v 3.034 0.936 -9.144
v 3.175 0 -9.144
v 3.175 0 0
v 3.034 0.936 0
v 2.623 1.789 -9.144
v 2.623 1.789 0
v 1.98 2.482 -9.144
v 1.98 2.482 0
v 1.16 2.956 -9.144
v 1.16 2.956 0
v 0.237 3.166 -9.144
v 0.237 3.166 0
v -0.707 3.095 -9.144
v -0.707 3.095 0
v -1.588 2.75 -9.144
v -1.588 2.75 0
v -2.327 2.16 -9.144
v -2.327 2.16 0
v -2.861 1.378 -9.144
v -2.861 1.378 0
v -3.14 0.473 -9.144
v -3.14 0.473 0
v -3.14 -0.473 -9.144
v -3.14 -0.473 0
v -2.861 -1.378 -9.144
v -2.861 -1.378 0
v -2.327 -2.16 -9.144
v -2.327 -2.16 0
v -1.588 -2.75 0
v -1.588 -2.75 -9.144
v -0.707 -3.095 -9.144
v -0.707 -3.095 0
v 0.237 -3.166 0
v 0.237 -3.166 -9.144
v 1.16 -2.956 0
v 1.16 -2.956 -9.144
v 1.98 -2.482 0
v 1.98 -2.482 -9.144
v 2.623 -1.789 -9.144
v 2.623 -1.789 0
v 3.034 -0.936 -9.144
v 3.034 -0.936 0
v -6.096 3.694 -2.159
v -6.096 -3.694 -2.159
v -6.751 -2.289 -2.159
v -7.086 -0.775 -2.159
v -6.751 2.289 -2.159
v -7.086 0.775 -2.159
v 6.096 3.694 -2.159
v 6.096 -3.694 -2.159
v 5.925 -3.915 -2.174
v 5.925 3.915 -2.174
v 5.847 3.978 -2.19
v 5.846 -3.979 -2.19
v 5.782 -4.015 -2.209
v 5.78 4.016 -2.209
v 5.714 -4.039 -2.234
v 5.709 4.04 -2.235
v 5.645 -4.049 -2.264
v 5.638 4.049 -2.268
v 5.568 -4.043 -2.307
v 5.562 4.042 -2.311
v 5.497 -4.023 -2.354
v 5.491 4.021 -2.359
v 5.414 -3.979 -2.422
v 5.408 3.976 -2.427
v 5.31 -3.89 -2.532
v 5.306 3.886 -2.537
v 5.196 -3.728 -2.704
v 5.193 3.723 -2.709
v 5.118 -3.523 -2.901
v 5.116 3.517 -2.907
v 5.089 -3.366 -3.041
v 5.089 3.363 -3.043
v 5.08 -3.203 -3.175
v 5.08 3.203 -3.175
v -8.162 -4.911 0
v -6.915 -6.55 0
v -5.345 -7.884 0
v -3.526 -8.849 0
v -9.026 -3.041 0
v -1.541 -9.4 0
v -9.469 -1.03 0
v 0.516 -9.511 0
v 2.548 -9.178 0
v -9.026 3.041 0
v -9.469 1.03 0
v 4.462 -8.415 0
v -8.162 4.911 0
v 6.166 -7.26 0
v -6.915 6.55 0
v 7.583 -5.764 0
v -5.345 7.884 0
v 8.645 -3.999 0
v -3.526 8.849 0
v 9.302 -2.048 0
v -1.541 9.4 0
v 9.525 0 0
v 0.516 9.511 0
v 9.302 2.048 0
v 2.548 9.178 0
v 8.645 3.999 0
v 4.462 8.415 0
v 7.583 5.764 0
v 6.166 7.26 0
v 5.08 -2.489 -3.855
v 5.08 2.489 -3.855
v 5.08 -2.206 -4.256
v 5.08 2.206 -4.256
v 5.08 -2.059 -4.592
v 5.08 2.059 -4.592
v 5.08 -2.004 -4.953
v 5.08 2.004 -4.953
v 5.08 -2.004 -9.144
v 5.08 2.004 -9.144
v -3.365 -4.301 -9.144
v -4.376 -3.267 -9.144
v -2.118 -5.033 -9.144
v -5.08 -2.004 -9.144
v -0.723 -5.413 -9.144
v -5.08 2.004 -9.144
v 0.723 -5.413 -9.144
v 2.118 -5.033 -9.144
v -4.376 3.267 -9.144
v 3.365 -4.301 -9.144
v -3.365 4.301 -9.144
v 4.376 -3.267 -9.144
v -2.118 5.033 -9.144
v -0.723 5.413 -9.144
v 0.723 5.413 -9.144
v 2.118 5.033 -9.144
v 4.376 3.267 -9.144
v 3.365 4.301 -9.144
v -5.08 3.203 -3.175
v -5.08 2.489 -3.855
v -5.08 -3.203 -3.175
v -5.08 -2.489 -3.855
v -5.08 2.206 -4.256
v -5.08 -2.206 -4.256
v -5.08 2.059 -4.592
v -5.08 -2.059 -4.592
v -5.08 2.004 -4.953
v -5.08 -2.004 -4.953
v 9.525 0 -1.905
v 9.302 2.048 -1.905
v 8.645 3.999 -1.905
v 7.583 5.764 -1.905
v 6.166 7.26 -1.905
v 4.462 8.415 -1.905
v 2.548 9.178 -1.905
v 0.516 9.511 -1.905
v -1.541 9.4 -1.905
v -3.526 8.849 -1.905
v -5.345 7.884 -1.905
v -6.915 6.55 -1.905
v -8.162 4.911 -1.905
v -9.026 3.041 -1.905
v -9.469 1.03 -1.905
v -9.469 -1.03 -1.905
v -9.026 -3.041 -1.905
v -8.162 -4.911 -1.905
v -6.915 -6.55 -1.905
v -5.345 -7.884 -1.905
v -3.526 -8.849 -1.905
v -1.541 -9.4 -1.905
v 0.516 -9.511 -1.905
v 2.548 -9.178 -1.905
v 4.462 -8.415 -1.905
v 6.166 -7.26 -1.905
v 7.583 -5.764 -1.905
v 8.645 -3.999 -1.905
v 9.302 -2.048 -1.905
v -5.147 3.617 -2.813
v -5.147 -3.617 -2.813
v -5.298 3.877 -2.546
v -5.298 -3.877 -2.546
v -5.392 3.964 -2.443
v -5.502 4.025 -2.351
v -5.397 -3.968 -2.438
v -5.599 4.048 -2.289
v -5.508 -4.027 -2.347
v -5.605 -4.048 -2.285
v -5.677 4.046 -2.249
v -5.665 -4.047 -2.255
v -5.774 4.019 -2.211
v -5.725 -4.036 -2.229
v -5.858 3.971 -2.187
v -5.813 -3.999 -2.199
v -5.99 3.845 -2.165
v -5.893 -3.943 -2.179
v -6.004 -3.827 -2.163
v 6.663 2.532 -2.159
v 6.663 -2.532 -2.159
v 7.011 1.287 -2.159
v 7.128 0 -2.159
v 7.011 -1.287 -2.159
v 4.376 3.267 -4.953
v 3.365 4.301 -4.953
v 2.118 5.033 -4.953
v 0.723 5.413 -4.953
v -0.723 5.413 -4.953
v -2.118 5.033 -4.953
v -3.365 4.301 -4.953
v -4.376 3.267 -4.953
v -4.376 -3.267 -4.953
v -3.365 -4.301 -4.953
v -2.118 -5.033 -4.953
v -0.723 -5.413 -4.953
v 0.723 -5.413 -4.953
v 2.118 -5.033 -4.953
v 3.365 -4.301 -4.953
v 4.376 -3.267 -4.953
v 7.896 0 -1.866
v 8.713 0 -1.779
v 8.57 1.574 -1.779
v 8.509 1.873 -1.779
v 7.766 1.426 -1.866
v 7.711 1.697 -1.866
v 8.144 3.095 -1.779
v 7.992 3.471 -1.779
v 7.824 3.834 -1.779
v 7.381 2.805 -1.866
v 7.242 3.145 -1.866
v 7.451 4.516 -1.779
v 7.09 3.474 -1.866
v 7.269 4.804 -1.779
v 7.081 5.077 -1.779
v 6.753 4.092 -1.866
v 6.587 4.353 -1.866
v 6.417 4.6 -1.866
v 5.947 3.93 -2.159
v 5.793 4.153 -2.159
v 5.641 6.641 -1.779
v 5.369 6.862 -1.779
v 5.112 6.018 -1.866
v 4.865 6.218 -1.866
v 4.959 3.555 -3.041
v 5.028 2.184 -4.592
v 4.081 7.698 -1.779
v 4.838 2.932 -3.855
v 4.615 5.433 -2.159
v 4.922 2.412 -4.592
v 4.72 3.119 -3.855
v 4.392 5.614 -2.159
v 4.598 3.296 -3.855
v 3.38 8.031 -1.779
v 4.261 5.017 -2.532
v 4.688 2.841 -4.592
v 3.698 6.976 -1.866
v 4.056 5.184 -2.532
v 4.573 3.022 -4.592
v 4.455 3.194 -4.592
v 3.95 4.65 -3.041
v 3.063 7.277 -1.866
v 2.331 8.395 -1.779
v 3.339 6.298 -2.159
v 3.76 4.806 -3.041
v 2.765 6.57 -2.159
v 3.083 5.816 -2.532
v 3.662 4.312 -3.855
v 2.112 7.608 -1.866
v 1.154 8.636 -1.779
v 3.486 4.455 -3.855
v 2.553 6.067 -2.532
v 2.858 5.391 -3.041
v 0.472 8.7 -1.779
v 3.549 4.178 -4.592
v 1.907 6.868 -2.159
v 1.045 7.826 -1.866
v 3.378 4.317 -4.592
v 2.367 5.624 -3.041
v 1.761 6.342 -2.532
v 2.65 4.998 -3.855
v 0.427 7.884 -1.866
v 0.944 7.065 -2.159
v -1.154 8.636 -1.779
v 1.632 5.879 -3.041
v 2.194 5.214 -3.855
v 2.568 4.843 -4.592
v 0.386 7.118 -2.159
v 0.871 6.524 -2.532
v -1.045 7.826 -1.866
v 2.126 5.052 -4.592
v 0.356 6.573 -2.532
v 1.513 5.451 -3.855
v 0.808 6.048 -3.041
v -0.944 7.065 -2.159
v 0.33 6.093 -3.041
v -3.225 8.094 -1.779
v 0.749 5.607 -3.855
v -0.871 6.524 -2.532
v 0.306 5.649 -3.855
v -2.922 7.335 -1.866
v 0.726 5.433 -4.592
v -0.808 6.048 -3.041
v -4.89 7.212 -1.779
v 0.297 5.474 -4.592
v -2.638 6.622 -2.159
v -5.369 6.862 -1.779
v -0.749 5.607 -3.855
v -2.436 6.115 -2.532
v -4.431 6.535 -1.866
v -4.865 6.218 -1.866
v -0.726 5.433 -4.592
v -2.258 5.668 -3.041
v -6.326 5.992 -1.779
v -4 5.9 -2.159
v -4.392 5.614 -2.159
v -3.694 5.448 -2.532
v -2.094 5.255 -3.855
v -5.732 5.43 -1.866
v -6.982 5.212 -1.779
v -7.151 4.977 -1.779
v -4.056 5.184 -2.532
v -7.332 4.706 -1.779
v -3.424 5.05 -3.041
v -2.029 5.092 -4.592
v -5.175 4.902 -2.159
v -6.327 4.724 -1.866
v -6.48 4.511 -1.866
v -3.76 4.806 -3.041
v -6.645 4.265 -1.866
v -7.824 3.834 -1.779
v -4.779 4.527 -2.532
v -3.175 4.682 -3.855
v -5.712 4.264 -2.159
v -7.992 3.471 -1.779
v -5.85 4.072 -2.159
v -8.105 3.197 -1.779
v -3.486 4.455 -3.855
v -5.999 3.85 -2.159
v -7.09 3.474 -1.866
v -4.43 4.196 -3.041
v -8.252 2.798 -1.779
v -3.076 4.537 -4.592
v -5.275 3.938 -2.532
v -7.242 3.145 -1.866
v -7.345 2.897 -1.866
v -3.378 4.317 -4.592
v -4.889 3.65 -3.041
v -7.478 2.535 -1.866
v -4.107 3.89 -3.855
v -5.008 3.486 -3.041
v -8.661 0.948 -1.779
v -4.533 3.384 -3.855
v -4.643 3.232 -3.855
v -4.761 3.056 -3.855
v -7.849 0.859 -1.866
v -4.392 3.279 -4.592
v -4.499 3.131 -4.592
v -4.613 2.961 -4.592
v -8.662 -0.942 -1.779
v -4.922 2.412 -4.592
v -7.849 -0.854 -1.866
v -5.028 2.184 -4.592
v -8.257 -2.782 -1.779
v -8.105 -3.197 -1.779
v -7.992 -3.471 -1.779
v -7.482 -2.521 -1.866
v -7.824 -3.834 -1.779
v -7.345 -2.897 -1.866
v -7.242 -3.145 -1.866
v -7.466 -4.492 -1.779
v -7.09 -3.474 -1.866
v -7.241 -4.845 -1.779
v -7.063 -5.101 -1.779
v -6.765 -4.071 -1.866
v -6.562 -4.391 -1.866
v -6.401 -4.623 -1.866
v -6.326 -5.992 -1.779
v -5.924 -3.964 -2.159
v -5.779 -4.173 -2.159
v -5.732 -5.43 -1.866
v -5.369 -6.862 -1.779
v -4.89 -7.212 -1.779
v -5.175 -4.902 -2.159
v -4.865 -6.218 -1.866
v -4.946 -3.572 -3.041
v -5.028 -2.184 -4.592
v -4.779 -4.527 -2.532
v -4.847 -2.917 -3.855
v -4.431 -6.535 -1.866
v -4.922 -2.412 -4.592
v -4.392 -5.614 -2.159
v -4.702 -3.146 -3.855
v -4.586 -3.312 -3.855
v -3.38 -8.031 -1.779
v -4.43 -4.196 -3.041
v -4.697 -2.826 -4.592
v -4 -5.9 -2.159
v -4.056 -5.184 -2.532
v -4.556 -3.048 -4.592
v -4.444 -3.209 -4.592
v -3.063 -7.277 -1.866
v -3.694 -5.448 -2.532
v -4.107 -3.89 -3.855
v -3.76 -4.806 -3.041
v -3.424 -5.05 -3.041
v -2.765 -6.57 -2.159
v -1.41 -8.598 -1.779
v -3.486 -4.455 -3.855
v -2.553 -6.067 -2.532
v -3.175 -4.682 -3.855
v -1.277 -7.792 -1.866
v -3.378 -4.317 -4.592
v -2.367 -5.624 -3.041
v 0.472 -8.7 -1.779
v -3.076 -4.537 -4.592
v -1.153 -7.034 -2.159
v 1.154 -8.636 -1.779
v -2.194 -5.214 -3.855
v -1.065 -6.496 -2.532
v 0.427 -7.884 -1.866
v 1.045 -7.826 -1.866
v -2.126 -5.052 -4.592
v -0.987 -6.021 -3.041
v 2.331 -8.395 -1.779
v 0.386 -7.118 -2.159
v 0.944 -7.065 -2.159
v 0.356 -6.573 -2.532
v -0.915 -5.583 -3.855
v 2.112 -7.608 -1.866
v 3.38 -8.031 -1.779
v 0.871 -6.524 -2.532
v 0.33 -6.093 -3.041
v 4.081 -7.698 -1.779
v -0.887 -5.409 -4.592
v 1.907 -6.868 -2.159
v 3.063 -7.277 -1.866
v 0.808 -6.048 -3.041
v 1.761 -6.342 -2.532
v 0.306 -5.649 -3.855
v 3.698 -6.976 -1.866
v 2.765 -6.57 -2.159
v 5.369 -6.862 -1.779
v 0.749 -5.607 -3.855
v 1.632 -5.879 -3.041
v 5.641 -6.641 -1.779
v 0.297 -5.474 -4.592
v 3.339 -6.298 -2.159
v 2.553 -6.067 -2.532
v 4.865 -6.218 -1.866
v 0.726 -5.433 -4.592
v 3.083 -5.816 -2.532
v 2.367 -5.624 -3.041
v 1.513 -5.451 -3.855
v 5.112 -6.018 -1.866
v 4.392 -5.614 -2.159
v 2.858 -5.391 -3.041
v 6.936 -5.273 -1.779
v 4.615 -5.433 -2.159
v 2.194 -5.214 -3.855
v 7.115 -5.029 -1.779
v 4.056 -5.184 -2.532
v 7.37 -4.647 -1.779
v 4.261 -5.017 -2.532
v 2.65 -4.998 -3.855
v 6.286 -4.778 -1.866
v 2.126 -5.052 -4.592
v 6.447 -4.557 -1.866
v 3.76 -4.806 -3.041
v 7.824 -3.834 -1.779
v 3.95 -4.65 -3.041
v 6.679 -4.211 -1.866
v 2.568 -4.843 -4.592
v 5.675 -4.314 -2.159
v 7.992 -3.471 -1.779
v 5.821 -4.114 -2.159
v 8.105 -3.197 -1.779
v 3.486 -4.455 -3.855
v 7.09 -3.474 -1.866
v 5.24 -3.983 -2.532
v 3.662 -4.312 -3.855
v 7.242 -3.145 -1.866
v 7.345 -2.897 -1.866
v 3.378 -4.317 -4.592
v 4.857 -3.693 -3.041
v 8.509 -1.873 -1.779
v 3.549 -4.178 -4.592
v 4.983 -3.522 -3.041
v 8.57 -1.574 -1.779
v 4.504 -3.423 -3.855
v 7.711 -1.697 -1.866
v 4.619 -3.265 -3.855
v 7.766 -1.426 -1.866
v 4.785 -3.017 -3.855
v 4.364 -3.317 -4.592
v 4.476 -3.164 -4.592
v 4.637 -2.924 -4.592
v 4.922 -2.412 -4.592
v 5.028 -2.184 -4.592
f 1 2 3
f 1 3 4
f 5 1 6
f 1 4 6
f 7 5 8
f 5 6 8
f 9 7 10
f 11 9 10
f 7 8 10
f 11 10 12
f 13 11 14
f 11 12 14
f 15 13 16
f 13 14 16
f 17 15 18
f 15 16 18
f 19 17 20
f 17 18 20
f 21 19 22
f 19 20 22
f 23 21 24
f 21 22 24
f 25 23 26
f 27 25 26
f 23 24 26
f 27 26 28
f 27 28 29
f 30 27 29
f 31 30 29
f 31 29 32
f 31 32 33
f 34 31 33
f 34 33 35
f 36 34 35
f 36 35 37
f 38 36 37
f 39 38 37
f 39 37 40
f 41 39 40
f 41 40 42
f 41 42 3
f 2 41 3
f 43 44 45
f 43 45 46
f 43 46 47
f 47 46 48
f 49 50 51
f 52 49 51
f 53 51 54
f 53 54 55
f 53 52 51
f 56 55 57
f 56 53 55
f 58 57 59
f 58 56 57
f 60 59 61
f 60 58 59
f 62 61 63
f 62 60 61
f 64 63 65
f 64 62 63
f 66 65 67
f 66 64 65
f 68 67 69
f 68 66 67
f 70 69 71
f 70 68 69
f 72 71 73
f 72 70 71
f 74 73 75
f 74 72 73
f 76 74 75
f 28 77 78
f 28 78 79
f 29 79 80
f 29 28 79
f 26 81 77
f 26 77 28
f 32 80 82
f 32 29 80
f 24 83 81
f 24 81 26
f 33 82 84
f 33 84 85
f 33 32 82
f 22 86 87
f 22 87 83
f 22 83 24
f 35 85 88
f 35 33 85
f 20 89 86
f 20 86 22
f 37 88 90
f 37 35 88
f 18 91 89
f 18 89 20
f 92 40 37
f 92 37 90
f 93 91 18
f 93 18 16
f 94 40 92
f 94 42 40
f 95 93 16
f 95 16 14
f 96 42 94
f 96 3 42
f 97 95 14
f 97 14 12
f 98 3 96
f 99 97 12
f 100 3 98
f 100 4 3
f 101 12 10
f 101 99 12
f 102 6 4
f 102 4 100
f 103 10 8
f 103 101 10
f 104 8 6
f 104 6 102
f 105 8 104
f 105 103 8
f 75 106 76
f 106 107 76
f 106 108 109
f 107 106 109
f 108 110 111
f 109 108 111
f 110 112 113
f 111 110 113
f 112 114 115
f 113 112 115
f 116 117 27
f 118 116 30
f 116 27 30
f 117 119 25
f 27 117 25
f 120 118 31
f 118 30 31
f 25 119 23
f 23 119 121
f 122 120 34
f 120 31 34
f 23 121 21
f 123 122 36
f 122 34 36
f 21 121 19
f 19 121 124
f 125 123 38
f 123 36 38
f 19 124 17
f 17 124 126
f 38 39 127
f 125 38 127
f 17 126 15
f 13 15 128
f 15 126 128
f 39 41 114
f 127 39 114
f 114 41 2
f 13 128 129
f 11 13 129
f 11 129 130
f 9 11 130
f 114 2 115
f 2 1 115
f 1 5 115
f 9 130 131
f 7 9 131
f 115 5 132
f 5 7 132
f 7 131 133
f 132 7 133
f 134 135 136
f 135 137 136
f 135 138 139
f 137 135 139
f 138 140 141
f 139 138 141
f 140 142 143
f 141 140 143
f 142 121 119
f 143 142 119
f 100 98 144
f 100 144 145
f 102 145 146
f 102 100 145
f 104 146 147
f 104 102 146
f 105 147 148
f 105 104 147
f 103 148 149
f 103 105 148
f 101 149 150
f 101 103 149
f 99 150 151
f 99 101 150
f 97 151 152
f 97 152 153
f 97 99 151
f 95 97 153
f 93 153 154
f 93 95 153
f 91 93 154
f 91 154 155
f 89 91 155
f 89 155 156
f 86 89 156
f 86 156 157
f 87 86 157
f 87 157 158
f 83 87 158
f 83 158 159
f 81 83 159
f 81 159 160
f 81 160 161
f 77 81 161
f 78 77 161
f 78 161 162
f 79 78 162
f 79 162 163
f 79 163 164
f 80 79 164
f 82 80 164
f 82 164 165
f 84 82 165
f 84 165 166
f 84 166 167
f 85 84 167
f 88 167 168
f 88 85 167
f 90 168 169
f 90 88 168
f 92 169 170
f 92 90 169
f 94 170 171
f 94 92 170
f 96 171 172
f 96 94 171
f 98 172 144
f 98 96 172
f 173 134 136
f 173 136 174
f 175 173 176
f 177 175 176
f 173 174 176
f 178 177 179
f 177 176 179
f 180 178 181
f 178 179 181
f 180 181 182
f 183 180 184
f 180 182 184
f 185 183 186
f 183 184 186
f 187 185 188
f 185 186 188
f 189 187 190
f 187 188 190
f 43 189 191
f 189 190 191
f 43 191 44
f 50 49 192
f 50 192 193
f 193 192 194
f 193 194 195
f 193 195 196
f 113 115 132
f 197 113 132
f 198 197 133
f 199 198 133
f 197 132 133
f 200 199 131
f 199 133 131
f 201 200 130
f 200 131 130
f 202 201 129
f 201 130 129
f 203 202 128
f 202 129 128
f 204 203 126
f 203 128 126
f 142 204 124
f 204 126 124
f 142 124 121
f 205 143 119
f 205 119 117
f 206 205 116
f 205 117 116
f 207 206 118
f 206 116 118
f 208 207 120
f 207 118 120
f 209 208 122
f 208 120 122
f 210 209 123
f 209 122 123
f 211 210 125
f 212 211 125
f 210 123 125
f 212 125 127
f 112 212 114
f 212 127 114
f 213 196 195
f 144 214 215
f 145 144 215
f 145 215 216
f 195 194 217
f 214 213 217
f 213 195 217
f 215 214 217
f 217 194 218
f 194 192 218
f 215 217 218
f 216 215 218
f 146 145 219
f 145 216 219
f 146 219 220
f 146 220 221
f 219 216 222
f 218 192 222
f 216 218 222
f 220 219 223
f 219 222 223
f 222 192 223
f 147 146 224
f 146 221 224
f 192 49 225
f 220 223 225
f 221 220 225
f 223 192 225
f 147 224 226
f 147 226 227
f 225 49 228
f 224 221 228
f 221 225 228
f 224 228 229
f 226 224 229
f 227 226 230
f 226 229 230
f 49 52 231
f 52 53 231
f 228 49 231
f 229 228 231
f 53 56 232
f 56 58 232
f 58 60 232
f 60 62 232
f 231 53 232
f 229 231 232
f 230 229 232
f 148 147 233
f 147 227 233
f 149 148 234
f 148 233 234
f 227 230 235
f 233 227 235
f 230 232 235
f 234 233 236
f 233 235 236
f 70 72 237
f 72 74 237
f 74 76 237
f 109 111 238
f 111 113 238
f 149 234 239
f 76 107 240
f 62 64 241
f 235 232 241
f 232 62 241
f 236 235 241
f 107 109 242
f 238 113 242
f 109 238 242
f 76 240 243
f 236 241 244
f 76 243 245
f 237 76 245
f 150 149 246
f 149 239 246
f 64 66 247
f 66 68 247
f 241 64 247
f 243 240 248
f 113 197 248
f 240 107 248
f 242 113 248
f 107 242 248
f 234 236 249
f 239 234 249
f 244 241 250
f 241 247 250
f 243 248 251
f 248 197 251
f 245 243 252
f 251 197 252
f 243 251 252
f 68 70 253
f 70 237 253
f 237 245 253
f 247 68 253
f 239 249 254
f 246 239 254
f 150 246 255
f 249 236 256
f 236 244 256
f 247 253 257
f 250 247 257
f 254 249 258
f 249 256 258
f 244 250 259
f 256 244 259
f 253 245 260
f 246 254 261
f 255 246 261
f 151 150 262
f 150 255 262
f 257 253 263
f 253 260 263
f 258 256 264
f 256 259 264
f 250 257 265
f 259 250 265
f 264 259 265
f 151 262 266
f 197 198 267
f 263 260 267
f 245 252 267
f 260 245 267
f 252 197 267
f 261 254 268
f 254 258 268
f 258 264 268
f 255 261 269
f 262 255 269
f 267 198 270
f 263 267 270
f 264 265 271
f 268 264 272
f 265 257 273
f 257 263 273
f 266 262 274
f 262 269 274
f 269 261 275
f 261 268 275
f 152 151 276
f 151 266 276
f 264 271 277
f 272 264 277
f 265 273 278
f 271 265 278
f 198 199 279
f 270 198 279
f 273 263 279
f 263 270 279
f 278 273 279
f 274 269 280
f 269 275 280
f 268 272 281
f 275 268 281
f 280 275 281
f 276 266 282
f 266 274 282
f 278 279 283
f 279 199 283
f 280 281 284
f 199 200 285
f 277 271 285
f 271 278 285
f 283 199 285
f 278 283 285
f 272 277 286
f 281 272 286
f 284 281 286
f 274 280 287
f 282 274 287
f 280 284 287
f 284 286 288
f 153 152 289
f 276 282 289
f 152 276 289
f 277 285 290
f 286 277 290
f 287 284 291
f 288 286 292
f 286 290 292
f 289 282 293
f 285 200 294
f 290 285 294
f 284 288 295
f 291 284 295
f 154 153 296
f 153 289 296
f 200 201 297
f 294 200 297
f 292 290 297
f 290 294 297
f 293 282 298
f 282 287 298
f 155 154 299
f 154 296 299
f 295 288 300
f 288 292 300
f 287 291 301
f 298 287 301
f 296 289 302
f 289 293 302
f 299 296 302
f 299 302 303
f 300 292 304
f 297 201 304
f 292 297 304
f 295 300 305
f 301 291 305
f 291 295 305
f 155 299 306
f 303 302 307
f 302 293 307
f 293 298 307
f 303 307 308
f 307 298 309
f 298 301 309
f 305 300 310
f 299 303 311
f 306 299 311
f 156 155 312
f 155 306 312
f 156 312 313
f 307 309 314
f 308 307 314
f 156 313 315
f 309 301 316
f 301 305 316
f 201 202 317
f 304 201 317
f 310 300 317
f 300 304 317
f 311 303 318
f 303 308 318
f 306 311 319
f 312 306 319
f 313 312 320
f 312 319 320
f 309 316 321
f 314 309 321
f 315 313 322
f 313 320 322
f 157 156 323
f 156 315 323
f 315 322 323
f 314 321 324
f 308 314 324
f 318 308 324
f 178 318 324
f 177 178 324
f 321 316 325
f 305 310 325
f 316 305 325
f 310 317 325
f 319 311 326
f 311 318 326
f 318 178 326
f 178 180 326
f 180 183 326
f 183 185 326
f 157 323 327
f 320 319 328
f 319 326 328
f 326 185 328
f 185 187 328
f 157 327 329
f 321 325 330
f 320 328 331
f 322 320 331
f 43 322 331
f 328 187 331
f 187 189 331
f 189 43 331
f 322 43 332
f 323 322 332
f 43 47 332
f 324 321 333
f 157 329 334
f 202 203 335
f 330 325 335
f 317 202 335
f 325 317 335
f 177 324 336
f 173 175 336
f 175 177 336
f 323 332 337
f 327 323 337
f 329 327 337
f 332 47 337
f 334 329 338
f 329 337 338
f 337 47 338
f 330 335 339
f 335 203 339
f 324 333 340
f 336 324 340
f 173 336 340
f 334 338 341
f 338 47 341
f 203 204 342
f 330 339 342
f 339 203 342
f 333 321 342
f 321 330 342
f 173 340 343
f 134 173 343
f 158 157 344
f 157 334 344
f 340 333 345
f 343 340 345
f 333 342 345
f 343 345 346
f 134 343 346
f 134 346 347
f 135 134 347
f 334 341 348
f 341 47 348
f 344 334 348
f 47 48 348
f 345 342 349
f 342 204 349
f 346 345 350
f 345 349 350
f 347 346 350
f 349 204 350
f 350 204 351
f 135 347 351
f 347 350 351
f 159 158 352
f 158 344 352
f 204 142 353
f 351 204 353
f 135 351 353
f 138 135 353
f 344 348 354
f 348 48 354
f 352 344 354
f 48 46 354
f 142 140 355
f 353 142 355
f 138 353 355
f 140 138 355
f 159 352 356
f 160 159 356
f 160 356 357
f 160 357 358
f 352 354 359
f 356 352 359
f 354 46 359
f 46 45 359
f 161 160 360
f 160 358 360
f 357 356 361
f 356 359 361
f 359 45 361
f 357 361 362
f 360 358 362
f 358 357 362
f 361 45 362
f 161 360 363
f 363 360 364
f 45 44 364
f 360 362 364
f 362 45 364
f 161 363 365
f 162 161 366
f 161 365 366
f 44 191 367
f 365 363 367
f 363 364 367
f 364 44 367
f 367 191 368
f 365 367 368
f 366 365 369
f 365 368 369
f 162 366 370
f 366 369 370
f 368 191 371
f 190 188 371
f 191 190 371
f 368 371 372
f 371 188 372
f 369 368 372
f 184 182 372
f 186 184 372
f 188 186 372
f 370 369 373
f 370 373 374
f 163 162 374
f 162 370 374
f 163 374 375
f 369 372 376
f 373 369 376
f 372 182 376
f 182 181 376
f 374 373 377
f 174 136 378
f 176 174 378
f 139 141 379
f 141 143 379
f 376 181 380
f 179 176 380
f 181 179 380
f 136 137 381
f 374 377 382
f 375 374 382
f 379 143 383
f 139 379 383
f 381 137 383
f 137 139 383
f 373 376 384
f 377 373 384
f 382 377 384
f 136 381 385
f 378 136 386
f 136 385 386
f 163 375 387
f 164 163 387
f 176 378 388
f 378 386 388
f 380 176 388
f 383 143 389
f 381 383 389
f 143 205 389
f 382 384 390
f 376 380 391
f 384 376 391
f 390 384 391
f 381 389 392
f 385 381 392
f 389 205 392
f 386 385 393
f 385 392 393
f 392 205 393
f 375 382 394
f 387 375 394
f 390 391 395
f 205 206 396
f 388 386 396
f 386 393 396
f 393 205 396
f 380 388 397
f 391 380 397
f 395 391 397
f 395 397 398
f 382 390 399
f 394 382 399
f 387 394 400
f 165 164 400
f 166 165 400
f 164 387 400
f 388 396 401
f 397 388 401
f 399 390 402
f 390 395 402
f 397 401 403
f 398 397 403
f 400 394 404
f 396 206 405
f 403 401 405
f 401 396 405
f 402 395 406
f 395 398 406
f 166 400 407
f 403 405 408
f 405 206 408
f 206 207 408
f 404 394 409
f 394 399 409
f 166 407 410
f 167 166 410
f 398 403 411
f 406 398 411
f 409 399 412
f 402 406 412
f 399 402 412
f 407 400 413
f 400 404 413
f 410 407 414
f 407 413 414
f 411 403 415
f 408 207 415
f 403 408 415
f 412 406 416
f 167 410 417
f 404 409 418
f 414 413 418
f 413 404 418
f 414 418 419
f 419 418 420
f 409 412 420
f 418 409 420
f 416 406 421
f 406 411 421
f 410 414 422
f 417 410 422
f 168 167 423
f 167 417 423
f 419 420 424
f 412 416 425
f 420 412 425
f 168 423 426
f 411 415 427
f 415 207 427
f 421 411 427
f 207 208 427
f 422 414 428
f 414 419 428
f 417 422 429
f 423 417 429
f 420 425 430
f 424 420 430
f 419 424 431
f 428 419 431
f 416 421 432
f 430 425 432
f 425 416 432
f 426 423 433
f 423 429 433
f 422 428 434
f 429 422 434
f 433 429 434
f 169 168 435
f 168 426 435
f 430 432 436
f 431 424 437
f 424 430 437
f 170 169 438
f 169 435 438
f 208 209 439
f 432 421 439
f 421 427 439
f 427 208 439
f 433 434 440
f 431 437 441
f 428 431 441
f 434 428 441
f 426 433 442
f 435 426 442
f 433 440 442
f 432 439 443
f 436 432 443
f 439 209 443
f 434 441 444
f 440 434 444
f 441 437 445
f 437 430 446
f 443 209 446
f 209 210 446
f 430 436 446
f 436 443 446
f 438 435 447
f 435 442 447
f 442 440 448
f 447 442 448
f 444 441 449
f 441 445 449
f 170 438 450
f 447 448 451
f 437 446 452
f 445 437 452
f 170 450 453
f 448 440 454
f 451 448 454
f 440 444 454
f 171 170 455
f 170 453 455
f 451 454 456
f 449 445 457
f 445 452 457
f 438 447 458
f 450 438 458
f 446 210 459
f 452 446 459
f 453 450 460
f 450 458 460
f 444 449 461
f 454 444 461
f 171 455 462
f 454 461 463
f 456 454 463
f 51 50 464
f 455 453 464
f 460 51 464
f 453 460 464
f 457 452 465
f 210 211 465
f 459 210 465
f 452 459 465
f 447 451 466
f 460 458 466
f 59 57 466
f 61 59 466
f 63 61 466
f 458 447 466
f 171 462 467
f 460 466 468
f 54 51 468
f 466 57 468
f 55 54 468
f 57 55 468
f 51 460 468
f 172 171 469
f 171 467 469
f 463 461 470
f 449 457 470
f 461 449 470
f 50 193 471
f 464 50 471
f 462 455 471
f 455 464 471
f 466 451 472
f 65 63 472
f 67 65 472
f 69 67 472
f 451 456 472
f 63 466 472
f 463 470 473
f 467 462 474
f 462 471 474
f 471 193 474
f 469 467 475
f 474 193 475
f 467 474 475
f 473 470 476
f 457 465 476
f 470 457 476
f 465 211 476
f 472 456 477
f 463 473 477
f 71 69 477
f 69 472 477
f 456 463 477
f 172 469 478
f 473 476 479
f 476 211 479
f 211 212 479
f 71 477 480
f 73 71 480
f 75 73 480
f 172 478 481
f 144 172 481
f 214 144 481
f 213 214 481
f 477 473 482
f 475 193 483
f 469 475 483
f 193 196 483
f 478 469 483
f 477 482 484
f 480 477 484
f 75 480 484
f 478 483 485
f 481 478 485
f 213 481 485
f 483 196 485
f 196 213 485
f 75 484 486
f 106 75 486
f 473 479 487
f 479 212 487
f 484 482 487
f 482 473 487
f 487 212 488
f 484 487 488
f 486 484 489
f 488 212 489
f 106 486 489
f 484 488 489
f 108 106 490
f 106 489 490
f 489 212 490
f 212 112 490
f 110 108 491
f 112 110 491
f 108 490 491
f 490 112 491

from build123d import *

# Parameters (mm, degrees)
F0_R     = 9.525
F0_R_2   = 3.175
F1_DEPTH = 25.4
F2_W     = 5.595942471
F2_H     = 0.8117107314
F4_W     = 5.7437195435
F4_H     = 10.4512684047
F4_H_2   = 14.192732051
F4_W_2   = 5.8874822214
F4_H_3   = 10.6966430321
F5_DEPTH = 6.985
F6_R     = 1.016


with BuildPart() as f1:
    # F0 (on Top) → F1 (new body)
    with BuildSketch(Plane.XY):
        Circle(F0_R)
        Circle(F0_R_2, mode=Mode.SUBTRACT)
    extrude(amount=-F1_DEPTH)

    # F2 (on Front) → F3 (revolve, cut)
    with BuildSketch(Plane.XZ):
        with BuildLine():
            Line((11.056942471, -4.953), (5.461, -4.953))
            ThreePointArc((5.461, -4.953), (7.5418947367, -7.9335299315), (11.056942471, -7.0071817232))
            Line((11.056942471, -7.0071817232), (11.056942471, -4.953))
        make_face()
        with BuildLine():
            ThreePointArc((11.056942471, -7.0071817232), (11.6165299315, -6.0471052633), (11.811, -4.953))
            ThreePointArc((11.811, -4.953), (8.636, -1.778), (5.461, -4.953))
            Line((5.461, -4.953), (11.056942471, -4.953))
            Line((11.056942471, -4.953), (11.056942471, -7.0071817232))
        make_face()
        Polygon((5.461, -9.9557107314), (5.461, -9.144), (0, -9.144), (0, -34.544), (12.0641607791, -34.544), (12.0641607791, -9.144), (11.056942471, -9.144), (11.056942471, -9.9557107314), align=None)
        with BuildLine():
            ThreePointArc((11.056942471, -7.0071817232), (7.5418947367, -7.9335299315), (5.461, -4.953))
            Line((5.461, -4.953), (5.461, -9.144))
            Line((5.461, -9.144), (11.056942471, -9.144))
            Line((11.056942471, -9.144), (11.056942471, -7.0071817232))
        make_face()
        with Locations((8.2589712355, -9.5498553657)):
            Rectangle(F2_W, F2_H)
    revolve(axis=Axis((0, 0, -25.4), (0, 0, 1)), mode=Mode.SUBTRACT)

    # F4 (on face) → F5 (cut)
    with BuildSketch(Plane(origin=(0, 0, -9.144), x_dir=(1, 0, 0), z_dir=(0, 0, -1))):
        with Locations((-8.3328597717, -5.2256342024)):
            Rectangle(F4_W, F4_H)
        with Locations((-8.3328597717, 7.0963660255)):
            Rectangle(F4_W, F4_H_2)
        with Locations((8.4047411107, 5.3483215161)):
            Rectangle(F4_W_2, F4_H_3)
        Polygon((11.3484822214, 0), (5.461, 0), (5.461, -9.0715084225), (5.461, -9.423006326), (11.6024822214, -9.423006326), (11.6024822214, 0), align=None)
        with BuildLine():
            Line((-5.08, -2.0040261974), (-5.08, 2.0040261974))
            ThreePointArc((-5.08, 2.0040261974), (-5.3649045192, 1.0199610287), (-5.461, 0))
            ThreePointArc((-5.461, 0), (-5.3649045192, -1.0199610287), (-5.08, -2.0040261974))
        make_face()
        with BuildLine():
            ThreePointArc((-5.461, 0), (-5.3649045192, 1.0199610287), (-5.08, 2.0040261974))
            Line((-5.08, 2.0040261974), (-5.08, 14.192732051))
            Line((-5.08, 14.192732051), (-5.461, 14.192732051))
            Line((-5.461, 14.192732051), (-5.461, 0))
        make_face()
        with BuildLine():
            Line((-5.08, -11.2700536847), (-5.08, -2.0040261974))
            ThreePointArc((-5.08, -2.0040261974), (-5.3649045192, -1.0199610287), (-5.461, 0))
            Line((-5.461, 0), (-5.461, -10.4512684047))
            Line((-5.461, -10.4512684047), (-5.461, -11.2700536847))
            Line((-5.461, -11.2700536847), (-5.08, -11.2700536847))
        make_face()
        with BuildLine():
            Line((5.461, -9.0715084225), (5.461, 0))
            ThreePointArc((5.461, 0), (5.3649045192, -1.0199610287), (5.08, -2.0040261974))
            Line((5.08, -2.0040261974), (5.08, -9.0715084225))
            Line((5.08, -9.0715084225), (5.461, -9.0715084225))
        make_face()
        with BuildLine():
            ThreePointArc((5.08, -2.0040261974), (5.3649045192, -1.0199610287), (5.461, 0))
            ThreePointArc((5.461, 0), (5.3649045192, 1.0199610287), (5.08, 2.0040261974))
            Line((5.08, 2.0040261974), (5.08, -2.0040261974))
        make_face()
        with BuildLine():
            ThreePointArc((5.08, 2.0040261974), (5.3649045192, 1.0199610287), (5.461, 0))
            Line((5.461, 0), (5.461, 10.6966430321))
            Line((5.461, 10.6966430321), (5.08, 10.6966430321))
            Line((5.08, 10.6966430321), (5.08, 2.0040261974))
        make_face()
    extrude(amount=-F5_DEPTH, mode=Mode.SUBTRACT)

    # F6
    f6_edges = [f1.edges().sort_by_distance(p)[0] for p in [
        (5.08, 0, -2.159),
        (-5.08, 0, -2.159),
    ]]
    fillet(f6_edges, radius=F6_R)


solid = f1.part
